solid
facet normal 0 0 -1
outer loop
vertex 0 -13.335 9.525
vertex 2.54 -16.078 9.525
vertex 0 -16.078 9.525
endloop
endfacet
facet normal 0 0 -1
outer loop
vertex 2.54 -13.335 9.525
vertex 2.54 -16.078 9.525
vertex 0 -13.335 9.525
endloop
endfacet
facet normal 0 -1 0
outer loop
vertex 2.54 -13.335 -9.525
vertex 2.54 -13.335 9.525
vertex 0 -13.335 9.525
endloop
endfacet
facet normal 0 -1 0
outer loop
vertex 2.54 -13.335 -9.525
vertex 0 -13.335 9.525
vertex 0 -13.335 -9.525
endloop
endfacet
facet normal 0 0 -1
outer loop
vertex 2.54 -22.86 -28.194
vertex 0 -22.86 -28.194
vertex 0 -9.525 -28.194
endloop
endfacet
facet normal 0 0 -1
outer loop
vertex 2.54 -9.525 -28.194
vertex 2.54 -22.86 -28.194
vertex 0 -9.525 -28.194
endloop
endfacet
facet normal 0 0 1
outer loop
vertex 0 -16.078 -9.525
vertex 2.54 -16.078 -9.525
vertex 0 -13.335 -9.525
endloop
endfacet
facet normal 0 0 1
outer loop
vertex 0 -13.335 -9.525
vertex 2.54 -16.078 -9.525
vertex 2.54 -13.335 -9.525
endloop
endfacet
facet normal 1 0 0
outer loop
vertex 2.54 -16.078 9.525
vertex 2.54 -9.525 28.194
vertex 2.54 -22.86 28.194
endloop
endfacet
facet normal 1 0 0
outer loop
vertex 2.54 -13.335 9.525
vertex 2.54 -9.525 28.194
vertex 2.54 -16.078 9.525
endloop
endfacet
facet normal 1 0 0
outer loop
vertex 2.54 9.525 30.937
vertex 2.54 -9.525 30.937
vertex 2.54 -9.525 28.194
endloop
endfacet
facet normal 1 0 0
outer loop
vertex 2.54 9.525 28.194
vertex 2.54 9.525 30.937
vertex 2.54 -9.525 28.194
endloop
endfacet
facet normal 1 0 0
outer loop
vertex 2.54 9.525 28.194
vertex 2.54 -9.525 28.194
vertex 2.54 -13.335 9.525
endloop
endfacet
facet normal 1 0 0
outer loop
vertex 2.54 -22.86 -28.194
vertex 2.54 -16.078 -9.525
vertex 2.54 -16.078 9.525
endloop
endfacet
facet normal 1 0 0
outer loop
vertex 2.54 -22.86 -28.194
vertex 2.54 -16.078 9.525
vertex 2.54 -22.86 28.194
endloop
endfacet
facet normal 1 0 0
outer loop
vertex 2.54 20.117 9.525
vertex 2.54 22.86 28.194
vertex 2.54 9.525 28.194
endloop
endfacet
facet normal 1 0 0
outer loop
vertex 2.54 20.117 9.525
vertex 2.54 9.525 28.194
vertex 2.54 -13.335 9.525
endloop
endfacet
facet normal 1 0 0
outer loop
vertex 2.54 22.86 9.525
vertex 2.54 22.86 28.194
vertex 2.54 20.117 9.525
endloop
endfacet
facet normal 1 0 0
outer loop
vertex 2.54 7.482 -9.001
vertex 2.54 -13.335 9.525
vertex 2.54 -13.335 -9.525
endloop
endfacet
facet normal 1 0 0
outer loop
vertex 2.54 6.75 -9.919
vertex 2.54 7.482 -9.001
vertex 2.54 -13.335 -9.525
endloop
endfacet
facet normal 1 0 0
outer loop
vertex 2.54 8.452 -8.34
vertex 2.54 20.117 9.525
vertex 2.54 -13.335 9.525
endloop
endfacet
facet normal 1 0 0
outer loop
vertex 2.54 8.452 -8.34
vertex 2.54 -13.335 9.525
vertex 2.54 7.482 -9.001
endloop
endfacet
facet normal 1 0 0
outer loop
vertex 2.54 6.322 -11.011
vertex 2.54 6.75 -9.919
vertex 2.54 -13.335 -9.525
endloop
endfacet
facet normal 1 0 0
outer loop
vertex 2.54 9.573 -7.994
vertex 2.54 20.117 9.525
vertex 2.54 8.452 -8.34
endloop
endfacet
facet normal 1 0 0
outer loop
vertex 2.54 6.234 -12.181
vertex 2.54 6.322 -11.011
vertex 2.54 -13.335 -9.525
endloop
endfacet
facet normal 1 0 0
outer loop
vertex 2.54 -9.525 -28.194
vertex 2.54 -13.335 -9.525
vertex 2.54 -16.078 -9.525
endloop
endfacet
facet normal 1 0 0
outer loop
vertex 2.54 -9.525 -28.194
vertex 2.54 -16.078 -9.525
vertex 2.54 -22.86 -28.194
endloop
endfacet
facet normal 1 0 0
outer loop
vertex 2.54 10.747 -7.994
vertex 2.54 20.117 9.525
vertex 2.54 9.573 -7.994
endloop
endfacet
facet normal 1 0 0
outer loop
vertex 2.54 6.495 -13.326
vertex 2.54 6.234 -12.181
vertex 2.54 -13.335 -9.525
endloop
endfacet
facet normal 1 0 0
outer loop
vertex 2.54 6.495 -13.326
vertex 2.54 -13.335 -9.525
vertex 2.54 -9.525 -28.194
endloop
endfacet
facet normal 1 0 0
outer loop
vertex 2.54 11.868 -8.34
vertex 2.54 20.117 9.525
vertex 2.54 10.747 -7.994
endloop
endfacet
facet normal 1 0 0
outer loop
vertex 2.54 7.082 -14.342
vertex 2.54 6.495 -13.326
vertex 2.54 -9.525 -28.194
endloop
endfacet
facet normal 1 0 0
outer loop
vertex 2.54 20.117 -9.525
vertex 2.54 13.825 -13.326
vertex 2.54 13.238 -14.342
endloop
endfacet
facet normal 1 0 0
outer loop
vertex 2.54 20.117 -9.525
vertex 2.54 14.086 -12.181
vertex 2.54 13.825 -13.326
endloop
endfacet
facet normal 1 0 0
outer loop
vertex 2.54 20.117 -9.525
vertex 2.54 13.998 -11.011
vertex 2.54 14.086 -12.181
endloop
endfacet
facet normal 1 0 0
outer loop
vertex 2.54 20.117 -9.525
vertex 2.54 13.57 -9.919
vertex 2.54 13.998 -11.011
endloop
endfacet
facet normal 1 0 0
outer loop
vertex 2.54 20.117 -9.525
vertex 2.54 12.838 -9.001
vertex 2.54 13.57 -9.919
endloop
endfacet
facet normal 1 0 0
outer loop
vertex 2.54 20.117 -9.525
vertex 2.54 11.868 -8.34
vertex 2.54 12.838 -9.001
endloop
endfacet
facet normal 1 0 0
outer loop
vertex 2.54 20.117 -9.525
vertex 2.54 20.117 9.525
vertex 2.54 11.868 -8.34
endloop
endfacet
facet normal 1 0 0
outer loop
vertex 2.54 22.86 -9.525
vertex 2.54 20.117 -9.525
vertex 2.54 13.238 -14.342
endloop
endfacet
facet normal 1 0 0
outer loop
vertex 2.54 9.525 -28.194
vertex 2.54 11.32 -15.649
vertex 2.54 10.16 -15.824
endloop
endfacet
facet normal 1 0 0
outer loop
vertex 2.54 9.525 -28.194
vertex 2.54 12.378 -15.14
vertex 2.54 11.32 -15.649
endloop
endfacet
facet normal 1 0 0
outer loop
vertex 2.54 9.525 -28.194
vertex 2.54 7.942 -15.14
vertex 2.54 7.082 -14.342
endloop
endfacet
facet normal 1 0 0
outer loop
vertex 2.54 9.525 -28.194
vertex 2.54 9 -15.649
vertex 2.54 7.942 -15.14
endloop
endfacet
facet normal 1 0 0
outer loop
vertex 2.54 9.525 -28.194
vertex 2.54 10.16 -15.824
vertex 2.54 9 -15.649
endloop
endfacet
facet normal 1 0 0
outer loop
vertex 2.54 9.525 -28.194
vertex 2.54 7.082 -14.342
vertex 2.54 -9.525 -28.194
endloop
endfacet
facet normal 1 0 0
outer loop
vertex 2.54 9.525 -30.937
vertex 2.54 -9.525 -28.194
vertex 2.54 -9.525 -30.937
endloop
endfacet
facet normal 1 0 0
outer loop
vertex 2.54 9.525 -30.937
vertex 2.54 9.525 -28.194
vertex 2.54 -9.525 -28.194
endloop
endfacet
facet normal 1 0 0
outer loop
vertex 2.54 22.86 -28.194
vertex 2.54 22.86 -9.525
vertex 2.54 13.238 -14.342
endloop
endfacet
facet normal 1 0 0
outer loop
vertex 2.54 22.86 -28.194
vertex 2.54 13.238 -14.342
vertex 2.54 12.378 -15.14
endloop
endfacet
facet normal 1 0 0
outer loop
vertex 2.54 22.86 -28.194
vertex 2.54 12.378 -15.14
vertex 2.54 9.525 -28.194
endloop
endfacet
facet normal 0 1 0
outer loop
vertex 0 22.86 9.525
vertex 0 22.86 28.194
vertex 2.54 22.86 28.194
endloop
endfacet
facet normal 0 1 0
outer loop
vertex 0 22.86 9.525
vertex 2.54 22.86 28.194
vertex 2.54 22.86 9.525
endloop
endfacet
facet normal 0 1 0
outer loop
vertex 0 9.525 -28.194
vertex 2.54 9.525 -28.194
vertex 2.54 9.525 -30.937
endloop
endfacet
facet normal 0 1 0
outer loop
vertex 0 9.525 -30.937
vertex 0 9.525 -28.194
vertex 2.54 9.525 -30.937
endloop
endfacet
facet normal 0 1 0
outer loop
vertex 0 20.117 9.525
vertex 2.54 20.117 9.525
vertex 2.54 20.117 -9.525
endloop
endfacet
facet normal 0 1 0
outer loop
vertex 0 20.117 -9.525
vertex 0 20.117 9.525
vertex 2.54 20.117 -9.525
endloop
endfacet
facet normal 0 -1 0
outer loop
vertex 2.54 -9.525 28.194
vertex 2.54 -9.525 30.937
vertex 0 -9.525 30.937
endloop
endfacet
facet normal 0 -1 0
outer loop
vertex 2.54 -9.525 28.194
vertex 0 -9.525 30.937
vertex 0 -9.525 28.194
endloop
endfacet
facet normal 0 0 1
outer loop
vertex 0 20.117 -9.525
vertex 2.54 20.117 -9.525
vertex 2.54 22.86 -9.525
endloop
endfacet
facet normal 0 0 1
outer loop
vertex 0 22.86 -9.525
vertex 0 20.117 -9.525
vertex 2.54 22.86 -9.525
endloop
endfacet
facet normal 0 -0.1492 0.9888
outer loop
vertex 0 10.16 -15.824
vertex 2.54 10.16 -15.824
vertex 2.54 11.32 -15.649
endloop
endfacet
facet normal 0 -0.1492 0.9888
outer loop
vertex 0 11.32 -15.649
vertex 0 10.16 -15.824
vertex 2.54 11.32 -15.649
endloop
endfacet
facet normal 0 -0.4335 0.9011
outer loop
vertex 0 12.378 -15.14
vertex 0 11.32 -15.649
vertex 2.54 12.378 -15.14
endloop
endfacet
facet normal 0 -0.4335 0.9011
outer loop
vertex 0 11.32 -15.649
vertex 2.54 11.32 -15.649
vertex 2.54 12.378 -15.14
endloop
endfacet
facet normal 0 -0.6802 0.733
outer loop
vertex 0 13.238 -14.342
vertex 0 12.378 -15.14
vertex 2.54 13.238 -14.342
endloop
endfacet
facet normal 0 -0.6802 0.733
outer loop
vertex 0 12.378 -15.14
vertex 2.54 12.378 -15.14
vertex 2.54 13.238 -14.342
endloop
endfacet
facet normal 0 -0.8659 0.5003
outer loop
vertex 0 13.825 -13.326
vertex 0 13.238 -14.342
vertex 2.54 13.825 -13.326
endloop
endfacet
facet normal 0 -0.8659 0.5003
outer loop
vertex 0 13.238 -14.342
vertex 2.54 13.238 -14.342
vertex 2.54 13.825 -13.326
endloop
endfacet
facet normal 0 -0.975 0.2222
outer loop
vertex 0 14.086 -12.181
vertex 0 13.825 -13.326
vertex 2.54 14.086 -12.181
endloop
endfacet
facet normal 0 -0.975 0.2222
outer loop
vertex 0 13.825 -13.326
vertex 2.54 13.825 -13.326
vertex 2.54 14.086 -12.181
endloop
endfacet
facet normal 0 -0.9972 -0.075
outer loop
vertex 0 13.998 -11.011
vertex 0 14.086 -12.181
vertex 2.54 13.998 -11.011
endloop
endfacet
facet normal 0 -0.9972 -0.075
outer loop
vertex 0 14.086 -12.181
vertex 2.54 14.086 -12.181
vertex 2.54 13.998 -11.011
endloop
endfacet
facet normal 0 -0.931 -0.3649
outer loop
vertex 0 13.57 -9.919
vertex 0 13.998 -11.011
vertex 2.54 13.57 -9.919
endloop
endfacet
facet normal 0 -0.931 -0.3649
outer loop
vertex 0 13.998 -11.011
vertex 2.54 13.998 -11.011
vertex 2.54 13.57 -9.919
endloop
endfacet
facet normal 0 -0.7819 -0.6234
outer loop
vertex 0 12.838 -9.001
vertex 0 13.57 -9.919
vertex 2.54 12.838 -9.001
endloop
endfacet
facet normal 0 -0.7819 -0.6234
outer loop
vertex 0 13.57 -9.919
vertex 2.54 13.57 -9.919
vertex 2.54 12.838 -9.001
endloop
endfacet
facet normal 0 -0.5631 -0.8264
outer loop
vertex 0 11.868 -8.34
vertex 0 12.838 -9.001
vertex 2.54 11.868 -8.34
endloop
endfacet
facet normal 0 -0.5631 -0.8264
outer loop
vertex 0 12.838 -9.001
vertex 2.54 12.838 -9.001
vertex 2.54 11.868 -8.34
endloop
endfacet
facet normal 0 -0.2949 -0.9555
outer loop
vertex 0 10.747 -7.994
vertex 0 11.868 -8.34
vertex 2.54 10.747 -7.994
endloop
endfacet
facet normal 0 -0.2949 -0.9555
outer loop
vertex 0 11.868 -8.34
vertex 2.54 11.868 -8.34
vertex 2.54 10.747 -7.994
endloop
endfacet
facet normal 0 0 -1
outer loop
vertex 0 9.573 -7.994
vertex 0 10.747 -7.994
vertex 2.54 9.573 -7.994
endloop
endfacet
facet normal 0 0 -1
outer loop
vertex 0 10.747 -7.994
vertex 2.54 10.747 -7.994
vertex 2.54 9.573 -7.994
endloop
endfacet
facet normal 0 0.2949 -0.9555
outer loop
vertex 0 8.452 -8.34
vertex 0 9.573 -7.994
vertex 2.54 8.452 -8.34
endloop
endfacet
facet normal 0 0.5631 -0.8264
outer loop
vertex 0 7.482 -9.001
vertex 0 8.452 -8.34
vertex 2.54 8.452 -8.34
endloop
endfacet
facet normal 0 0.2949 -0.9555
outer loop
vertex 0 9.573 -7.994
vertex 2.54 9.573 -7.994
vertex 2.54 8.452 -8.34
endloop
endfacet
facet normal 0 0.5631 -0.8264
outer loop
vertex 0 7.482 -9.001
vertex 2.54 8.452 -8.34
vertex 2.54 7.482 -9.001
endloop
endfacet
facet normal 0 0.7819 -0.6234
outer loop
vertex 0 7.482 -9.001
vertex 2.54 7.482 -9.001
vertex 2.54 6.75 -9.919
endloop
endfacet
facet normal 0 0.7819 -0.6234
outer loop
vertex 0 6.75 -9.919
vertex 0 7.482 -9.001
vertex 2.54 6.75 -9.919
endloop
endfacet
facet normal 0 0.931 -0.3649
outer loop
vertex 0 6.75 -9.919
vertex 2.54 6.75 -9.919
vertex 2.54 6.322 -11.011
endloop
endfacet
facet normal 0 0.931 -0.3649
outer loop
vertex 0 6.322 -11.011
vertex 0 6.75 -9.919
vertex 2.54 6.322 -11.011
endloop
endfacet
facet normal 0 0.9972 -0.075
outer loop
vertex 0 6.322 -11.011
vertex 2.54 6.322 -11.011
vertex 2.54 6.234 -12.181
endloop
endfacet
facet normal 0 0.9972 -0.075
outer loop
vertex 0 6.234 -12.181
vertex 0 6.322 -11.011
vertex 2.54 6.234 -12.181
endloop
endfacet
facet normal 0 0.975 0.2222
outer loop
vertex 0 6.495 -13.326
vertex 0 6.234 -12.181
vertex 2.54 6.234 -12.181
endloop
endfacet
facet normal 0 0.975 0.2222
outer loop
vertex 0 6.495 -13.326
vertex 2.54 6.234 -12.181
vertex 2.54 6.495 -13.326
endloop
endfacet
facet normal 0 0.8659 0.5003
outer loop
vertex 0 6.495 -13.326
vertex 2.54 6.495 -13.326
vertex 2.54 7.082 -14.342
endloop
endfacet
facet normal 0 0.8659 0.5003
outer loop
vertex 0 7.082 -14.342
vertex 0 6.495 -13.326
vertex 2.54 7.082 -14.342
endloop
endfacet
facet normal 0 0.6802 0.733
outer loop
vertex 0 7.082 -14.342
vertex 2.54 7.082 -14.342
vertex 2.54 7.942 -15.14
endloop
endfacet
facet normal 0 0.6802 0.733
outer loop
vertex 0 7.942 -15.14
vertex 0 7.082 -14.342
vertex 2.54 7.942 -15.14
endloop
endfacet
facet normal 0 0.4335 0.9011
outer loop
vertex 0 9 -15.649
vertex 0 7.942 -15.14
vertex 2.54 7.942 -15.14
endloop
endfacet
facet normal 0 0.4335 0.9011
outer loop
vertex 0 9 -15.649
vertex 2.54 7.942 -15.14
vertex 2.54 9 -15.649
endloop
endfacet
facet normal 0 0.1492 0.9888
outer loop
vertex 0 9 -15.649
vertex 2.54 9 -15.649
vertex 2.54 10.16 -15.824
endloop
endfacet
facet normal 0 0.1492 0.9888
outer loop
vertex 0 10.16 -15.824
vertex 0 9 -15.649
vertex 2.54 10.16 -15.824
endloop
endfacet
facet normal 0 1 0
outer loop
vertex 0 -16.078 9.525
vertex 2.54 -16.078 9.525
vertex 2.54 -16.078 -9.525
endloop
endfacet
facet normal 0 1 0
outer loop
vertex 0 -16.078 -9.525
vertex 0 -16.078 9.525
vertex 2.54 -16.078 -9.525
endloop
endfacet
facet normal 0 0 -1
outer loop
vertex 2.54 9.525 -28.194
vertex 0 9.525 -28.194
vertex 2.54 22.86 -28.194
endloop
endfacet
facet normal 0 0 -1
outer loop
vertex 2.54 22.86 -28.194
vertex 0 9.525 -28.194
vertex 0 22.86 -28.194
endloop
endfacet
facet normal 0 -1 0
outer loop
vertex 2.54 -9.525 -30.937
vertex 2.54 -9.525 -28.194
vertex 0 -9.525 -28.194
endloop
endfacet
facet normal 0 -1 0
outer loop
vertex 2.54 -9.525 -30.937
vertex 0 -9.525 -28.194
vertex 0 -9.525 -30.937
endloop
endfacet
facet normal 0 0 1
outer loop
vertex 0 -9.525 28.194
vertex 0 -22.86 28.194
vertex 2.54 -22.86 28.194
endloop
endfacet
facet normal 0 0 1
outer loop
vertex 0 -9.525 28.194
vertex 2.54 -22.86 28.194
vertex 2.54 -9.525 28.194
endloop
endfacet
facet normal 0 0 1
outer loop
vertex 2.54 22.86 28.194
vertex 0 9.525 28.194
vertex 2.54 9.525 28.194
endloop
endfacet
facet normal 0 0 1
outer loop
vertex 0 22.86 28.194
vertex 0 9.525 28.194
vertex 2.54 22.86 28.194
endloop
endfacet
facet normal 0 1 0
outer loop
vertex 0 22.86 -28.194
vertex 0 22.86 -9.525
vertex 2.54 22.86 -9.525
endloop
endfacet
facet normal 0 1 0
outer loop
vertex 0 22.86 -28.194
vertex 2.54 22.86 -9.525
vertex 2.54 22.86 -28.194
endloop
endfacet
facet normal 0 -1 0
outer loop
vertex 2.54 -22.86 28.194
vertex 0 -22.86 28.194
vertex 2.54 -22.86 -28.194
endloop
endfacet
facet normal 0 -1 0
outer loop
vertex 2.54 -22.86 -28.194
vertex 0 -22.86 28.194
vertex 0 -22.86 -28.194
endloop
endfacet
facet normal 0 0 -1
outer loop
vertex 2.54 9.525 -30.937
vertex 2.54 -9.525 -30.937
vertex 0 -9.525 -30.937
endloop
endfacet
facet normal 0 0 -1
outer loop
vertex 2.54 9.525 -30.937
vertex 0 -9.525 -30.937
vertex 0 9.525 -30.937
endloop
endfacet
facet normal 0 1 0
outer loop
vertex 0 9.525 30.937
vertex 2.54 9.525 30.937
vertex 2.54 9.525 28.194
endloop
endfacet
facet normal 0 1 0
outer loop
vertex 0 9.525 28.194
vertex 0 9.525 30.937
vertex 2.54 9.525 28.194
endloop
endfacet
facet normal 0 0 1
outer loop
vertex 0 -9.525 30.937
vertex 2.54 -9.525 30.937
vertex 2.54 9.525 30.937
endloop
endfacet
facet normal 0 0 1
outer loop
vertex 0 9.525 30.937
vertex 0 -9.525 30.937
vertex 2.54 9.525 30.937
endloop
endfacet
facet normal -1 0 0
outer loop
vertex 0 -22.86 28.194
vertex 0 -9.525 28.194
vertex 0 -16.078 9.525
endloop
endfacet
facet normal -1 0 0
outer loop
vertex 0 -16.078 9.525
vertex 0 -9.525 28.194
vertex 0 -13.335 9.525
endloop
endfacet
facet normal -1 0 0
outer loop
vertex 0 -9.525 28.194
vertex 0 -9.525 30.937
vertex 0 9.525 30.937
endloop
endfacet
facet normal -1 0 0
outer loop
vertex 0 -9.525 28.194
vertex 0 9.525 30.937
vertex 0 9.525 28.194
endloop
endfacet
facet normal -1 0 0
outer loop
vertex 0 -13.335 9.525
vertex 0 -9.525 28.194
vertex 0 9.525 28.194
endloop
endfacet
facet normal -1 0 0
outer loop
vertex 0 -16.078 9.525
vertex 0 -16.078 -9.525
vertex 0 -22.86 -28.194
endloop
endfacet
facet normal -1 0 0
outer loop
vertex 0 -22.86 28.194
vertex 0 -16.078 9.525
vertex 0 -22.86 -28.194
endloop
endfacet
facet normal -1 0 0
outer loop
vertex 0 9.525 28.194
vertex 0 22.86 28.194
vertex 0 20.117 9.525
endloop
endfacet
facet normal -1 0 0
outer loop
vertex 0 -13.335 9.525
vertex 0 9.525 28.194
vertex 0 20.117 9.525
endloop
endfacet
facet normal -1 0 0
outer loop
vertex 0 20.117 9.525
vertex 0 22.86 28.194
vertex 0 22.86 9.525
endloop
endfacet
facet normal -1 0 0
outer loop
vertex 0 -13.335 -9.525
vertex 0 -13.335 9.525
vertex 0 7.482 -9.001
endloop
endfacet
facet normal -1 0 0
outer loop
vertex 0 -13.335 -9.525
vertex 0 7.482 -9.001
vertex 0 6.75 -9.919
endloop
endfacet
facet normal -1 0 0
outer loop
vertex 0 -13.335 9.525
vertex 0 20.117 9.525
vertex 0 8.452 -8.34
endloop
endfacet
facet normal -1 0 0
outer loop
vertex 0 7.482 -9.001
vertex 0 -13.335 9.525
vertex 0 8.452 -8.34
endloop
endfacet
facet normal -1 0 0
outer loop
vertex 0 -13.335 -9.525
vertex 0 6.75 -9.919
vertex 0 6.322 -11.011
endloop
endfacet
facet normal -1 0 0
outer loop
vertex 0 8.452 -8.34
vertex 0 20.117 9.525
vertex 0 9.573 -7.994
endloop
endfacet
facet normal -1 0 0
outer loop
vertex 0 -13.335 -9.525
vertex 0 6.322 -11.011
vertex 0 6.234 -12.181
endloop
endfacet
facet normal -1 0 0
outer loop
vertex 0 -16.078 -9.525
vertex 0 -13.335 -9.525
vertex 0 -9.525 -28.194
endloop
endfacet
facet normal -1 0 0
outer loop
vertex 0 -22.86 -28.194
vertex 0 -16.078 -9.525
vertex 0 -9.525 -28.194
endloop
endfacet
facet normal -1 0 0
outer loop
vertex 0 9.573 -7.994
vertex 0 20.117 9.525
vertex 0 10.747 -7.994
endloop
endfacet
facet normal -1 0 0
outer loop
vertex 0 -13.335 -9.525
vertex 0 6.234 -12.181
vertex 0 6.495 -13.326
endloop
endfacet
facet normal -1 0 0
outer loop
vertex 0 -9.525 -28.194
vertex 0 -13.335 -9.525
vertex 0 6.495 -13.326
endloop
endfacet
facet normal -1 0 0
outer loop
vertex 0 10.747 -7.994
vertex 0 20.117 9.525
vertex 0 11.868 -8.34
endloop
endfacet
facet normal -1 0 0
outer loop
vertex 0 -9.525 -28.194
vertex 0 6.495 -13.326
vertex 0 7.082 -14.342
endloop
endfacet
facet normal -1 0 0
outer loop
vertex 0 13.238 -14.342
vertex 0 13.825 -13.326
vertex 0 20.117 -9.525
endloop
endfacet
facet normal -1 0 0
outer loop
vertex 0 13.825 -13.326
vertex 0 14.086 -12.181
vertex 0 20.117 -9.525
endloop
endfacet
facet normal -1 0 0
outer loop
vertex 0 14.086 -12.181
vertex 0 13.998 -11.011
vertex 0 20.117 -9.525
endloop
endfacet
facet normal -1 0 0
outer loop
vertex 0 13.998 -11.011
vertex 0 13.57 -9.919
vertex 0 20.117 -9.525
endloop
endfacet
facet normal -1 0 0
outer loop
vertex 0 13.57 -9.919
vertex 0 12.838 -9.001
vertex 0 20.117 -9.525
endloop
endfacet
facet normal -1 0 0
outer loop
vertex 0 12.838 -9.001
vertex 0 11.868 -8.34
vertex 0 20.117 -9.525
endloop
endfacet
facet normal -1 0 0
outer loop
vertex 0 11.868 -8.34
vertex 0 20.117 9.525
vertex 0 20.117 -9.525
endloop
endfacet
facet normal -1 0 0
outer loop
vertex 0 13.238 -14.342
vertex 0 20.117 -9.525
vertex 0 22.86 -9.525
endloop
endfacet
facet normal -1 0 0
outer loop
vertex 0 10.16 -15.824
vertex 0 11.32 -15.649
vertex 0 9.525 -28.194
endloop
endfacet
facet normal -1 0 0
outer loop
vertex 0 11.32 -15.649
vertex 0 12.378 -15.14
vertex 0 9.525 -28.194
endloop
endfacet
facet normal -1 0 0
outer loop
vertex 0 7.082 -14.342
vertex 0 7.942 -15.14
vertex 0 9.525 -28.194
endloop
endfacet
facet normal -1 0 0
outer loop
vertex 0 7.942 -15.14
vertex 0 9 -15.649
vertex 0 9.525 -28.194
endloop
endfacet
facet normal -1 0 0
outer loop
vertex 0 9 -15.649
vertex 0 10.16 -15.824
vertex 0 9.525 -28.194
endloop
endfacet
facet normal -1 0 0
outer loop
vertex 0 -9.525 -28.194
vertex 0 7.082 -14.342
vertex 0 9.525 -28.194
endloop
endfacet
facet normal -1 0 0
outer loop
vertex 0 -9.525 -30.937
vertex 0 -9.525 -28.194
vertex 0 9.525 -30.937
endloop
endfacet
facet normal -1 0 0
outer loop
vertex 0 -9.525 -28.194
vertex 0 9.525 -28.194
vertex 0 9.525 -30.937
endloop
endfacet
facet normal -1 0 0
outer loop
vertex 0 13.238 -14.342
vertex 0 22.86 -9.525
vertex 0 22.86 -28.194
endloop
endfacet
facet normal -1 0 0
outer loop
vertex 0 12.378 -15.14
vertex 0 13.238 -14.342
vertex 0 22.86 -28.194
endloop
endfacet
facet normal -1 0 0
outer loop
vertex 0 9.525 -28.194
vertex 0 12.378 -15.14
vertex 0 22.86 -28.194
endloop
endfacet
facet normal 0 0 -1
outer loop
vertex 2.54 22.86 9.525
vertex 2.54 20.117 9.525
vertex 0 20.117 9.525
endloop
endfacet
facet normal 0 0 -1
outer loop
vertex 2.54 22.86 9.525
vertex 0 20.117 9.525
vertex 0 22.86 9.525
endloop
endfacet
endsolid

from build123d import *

# Parameters (mm, degrees)
SKETCH1_W           = 56.388
SKETCH1_H           = 45.72
BOSS_EXTRUDE1_DEPTH = 2.54
SKETCH2_W           = 2.7432
SKETCH2_H           = 19.05
BOSS_EXTRUDE2_DEPTH = 2.54
SKETCH3_W           = 19.05
SKETCH3_H           = 2.7432
CUT_EXTRUDE1_DEPTH  = 3.54
SKETCH4_R           = 3.937
CUT_EXTRUDE2_DEPTH  = 3.54


with BuildPart() as part:
    # Sketch1 → Boss-Extrude1 (new body)
    with BuildSketch(Plane(origin=(0, 0, 0), x_dir=(0, 0, -1), z_dir=(1, 0, 0))):
        Rectangle(SKETCH1_W, SKETCH1_H)
    extrude(amount=BOSS_EXTRUDE1_DEPTH)

    # Sketch2 → Boss-Extrude2 (add)
    with BuildSketch(Plane(origin=(2.54, 0, 0), x_dir=(0, 0, -1), z_dir=(1, 0, 0))):
        with Locations((-29.5656, 0)):
            Rectangle(SKETCH2_W, SKETCH2_H)
        with Locations((29.5656, 0)):
            Rectangle(SKETCH2_W, SKETCH2_H)
    extrude(amount=-BOSS_EXTRUDE2_DEPTH)

    # Sketch3 → Cut-Extrude1 (cut, through all)
    with BuildSketch(Plane(origin=(2.54, 0, 0), x_dir=(0, 0, -1), z_dir=(1, 0, 0))):
        with Locations((0, 21.4884)):
            Rectangle(SKETCH3_W, SKETCH3_H)
        with Locations((0, -14.7066)):
            Rectangle(SKETCH3_W, SKETCH3_H)
    extrude(amount=-CUT_EXTRUDE1_DEPTH, mode=Mode.SUBTRACT)

    # Sketch4 → Cut-Extrude2 (cut, through all)
    with BuildSketch(Plane(origin=(2.54, 0, 0), x_dir=(0, 0, -1), z_dir=(1, 0, 0))):
        with Locations((11.8872, 10.16)):
            Circle(SKETCH4_R)
    extrude(amount=-CUT_EXTRUDE2_DEPTH, mode=Mode.SUBTRACT)


solid = part.part
